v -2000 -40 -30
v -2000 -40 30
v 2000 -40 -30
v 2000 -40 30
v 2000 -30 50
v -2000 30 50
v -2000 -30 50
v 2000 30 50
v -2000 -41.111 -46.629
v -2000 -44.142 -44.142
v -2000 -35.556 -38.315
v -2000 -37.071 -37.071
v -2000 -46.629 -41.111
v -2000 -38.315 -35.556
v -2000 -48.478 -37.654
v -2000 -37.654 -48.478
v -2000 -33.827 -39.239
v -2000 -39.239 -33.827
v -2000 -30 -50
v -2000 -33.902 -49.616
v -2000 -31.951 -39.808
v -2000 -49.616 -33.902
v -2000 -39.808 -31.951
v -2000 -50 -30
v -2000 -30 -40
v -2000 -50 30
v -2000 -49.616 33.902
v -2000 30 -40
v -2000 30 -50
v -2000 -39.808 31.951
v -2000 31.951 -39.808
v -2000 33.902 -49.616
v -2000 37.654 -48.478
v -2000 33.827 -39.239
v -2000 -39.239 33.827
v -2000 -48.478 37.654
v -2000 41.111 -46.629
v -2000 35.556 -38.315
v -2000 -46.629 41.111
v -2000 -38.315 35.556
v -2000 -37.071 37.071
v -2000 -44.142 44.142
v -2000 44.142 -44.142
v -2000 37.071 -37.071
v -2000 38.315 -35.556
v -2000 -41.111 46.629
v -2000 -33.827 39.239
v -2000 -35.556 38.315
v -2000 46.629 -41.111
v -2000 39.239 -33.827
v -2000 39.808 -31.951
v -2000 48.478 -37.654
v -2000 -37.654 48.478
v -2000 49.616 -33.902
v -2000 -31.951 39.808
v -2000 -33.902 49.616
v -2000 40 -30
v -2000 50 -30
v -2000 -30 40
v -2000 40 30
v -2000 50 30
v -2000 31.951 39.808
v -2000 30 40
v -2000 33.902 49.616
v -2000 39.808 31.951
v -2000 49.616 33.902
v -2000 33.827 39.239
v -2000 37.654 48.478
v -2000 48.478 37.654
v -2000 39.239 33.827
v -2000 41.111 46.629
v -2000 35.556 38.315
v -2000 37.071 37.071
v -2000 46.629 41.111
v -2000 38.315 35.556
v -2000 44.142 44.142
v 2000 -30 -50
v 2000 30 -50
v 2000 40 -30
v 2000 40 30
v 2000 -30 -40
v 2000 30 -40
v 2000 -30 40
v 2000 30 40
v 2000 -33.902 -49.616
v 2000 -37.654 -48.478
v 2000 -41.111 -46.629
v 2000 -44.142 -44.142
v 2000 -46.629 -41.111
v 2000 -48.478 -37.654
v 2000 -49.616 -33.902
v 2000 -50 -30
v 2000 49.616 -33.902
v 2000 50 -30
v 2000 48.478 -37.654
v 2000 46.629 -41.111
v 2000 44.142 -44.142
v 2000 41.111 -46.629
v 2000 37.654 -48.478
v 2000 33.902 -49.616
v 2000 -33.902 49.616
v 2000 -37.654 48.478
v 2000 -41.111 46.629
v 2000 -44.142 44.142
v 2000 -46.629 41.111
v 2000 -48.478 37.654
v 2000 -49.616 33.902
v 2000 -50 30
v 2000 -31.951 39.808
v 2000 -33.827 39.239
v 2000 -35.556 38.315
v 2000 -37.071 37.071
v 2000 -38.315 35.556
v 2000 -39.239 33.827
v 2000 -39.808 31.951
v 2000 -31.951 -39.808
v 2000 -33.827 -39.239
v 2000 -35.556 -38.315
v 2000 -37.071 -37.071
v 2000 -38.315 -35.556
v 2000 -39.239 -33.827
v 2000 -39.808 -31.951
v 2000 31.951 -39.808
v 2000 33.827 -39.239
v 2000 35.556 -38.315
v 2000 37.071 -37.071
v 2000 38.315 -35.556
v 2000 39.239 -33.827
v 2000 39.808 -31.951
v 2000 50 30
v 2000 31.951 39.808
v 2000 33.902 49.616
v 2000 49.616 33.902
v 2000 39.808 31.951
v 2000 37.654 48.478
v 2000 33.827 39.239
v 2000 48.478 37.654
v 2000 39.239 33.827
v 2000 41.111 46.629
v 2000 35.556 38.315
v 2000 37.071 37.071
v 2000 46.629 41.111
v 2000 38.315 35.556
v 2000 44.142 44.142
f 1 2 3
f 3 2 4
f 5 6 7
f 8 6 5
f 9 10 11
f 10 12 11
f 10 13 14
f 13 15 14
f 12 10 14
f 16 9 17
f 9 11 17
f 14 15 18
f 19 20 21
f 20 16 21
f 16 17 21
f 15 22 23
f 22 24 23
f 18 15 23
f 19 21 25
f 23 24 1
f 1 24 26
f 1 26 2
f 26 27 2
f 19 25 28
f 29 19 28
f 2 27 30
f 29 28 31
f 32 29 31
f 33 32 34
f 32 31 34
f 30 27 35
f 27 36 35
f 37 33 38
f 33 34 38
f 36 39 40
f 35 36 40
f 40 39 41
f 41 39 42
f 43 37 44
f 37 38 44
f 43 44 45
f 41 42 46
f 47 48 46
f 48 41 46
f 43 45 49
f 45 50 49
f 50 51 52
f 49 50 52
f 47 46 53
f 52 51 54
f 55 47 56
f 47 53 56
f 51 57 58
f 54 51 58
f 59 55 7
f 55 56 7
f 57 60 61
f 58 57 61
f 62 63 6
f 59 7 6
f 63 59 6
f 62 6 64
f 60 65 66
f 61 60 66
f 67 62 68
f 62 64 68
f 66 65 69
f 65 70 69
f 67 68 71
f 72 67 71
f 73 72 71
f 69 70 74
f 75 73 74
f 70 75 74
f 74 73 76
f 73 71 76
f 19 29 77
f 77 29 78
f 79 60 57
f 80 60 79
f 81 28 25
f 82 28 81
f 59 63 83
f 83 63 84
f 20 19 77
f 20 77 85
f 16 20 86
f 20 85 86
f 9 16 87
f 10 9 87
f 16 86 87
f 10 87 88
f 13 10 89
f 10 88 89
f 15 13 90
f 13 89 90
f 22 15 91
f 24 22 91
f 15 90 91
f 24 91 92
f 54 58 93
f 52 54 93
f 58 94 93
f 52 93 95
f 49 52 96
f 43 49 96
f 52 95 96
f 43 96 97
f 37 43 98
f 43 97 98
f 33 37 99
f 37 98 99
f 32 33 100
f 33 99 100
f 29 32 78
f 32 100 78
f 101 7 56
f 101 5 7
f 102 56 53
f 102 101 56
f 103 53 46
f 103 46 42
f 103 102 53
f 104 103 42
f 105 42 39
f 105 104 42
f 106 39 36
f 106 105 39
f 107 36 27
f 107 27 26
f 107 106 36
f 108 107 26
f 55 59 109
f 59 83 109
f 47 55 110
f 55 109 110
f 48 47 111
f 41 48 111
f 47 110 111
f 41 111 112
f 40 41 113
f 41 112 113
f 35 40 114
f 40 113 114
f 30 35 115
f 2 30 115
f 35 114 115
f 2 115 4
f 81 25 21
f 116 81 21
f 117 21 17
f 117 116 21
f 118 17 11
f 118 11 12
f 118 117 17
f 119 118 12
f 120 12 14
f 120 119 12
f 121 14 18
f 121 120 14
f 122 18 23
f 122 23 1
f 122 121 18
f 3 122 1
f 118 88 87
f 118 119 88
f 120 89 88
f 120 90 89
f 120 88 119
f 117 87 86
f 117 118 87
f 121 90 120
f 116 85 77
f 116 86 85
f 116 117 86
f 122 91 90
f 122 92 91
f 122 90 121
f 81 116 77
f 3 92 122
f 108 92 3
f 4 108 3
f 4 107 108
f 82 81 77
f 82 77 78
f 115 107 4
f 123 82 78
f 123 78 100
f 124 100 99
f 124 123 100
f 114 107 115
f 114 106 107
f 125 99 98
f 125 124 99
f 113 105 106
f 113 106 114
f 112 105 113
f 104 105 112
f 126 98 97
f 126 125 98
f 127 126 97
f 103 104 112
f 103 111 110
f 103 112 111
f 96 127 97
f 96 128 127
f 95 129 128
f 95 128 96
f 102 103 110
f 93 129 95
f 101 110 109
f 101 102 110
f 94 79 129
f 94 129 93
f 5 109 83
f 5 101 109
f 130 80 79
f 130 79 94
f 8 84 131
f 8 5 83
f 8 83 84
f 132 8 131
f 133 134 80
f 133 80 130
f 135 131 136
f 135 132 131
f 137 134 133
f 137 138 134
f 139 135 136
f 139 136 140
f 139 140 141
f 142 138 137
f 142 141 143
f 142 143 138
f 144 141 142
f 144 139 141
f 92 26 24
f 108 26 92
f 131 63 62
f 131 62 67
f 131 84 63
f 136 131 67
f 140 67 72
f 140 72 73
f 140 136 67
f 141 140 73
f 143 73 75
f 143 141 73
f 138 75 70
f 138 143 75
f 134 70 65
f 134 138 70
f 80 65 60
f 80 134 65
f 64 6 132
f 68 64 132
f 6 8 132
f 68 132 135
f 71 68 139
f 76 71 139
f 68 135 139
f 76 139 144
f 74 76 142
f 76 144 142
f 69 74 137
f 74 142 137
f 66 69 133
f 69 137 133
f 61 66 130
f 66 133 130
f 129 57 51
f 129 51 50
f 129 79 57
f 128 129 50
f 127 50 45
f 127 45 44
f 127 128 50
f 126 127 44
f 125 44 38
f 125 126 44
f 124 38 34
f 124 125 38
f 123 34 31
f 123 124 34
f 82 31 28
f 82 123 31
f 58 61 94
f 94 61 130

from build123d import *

# Parameters (mm, degrees)
F0_W     = 4000
F0_H     = 100
F1_DEPTH = 50
F2_R     = 20
F3_T     = -10


with BuildPart() as f1:
    # F0 (on Top) → F1 (new body, symmetric)
    with BuildSketch(Plane.XY):
        Rectangle(F0_W, F0_H)
    extrude(amount=F1_DEPTH, both=True)

    # F2
    f2_edges = [f1.edges().sort_by_distance(p)[0] for p in [
        (0, 50, 50),
        (0, -50, -50),
        (0, -50, 50),
        (0, 50, -50),
    ]]
    fillet(f2_edges, radius=F2_R)

    # F3
    f3_openings = [f1.faces().sort_by_distance(p)[0] for p in [
        (2000, 0, 0),
        (-2000, 0, 0),
    ]]
    offset(amount=F3_T, openings=f3_openings)

    # F4: F1 across plane


with BuildPart() as f1_1:
    add(f1.part)
    add(f1.part.mirror(Plane.YZ))


solid = f1_1.part
